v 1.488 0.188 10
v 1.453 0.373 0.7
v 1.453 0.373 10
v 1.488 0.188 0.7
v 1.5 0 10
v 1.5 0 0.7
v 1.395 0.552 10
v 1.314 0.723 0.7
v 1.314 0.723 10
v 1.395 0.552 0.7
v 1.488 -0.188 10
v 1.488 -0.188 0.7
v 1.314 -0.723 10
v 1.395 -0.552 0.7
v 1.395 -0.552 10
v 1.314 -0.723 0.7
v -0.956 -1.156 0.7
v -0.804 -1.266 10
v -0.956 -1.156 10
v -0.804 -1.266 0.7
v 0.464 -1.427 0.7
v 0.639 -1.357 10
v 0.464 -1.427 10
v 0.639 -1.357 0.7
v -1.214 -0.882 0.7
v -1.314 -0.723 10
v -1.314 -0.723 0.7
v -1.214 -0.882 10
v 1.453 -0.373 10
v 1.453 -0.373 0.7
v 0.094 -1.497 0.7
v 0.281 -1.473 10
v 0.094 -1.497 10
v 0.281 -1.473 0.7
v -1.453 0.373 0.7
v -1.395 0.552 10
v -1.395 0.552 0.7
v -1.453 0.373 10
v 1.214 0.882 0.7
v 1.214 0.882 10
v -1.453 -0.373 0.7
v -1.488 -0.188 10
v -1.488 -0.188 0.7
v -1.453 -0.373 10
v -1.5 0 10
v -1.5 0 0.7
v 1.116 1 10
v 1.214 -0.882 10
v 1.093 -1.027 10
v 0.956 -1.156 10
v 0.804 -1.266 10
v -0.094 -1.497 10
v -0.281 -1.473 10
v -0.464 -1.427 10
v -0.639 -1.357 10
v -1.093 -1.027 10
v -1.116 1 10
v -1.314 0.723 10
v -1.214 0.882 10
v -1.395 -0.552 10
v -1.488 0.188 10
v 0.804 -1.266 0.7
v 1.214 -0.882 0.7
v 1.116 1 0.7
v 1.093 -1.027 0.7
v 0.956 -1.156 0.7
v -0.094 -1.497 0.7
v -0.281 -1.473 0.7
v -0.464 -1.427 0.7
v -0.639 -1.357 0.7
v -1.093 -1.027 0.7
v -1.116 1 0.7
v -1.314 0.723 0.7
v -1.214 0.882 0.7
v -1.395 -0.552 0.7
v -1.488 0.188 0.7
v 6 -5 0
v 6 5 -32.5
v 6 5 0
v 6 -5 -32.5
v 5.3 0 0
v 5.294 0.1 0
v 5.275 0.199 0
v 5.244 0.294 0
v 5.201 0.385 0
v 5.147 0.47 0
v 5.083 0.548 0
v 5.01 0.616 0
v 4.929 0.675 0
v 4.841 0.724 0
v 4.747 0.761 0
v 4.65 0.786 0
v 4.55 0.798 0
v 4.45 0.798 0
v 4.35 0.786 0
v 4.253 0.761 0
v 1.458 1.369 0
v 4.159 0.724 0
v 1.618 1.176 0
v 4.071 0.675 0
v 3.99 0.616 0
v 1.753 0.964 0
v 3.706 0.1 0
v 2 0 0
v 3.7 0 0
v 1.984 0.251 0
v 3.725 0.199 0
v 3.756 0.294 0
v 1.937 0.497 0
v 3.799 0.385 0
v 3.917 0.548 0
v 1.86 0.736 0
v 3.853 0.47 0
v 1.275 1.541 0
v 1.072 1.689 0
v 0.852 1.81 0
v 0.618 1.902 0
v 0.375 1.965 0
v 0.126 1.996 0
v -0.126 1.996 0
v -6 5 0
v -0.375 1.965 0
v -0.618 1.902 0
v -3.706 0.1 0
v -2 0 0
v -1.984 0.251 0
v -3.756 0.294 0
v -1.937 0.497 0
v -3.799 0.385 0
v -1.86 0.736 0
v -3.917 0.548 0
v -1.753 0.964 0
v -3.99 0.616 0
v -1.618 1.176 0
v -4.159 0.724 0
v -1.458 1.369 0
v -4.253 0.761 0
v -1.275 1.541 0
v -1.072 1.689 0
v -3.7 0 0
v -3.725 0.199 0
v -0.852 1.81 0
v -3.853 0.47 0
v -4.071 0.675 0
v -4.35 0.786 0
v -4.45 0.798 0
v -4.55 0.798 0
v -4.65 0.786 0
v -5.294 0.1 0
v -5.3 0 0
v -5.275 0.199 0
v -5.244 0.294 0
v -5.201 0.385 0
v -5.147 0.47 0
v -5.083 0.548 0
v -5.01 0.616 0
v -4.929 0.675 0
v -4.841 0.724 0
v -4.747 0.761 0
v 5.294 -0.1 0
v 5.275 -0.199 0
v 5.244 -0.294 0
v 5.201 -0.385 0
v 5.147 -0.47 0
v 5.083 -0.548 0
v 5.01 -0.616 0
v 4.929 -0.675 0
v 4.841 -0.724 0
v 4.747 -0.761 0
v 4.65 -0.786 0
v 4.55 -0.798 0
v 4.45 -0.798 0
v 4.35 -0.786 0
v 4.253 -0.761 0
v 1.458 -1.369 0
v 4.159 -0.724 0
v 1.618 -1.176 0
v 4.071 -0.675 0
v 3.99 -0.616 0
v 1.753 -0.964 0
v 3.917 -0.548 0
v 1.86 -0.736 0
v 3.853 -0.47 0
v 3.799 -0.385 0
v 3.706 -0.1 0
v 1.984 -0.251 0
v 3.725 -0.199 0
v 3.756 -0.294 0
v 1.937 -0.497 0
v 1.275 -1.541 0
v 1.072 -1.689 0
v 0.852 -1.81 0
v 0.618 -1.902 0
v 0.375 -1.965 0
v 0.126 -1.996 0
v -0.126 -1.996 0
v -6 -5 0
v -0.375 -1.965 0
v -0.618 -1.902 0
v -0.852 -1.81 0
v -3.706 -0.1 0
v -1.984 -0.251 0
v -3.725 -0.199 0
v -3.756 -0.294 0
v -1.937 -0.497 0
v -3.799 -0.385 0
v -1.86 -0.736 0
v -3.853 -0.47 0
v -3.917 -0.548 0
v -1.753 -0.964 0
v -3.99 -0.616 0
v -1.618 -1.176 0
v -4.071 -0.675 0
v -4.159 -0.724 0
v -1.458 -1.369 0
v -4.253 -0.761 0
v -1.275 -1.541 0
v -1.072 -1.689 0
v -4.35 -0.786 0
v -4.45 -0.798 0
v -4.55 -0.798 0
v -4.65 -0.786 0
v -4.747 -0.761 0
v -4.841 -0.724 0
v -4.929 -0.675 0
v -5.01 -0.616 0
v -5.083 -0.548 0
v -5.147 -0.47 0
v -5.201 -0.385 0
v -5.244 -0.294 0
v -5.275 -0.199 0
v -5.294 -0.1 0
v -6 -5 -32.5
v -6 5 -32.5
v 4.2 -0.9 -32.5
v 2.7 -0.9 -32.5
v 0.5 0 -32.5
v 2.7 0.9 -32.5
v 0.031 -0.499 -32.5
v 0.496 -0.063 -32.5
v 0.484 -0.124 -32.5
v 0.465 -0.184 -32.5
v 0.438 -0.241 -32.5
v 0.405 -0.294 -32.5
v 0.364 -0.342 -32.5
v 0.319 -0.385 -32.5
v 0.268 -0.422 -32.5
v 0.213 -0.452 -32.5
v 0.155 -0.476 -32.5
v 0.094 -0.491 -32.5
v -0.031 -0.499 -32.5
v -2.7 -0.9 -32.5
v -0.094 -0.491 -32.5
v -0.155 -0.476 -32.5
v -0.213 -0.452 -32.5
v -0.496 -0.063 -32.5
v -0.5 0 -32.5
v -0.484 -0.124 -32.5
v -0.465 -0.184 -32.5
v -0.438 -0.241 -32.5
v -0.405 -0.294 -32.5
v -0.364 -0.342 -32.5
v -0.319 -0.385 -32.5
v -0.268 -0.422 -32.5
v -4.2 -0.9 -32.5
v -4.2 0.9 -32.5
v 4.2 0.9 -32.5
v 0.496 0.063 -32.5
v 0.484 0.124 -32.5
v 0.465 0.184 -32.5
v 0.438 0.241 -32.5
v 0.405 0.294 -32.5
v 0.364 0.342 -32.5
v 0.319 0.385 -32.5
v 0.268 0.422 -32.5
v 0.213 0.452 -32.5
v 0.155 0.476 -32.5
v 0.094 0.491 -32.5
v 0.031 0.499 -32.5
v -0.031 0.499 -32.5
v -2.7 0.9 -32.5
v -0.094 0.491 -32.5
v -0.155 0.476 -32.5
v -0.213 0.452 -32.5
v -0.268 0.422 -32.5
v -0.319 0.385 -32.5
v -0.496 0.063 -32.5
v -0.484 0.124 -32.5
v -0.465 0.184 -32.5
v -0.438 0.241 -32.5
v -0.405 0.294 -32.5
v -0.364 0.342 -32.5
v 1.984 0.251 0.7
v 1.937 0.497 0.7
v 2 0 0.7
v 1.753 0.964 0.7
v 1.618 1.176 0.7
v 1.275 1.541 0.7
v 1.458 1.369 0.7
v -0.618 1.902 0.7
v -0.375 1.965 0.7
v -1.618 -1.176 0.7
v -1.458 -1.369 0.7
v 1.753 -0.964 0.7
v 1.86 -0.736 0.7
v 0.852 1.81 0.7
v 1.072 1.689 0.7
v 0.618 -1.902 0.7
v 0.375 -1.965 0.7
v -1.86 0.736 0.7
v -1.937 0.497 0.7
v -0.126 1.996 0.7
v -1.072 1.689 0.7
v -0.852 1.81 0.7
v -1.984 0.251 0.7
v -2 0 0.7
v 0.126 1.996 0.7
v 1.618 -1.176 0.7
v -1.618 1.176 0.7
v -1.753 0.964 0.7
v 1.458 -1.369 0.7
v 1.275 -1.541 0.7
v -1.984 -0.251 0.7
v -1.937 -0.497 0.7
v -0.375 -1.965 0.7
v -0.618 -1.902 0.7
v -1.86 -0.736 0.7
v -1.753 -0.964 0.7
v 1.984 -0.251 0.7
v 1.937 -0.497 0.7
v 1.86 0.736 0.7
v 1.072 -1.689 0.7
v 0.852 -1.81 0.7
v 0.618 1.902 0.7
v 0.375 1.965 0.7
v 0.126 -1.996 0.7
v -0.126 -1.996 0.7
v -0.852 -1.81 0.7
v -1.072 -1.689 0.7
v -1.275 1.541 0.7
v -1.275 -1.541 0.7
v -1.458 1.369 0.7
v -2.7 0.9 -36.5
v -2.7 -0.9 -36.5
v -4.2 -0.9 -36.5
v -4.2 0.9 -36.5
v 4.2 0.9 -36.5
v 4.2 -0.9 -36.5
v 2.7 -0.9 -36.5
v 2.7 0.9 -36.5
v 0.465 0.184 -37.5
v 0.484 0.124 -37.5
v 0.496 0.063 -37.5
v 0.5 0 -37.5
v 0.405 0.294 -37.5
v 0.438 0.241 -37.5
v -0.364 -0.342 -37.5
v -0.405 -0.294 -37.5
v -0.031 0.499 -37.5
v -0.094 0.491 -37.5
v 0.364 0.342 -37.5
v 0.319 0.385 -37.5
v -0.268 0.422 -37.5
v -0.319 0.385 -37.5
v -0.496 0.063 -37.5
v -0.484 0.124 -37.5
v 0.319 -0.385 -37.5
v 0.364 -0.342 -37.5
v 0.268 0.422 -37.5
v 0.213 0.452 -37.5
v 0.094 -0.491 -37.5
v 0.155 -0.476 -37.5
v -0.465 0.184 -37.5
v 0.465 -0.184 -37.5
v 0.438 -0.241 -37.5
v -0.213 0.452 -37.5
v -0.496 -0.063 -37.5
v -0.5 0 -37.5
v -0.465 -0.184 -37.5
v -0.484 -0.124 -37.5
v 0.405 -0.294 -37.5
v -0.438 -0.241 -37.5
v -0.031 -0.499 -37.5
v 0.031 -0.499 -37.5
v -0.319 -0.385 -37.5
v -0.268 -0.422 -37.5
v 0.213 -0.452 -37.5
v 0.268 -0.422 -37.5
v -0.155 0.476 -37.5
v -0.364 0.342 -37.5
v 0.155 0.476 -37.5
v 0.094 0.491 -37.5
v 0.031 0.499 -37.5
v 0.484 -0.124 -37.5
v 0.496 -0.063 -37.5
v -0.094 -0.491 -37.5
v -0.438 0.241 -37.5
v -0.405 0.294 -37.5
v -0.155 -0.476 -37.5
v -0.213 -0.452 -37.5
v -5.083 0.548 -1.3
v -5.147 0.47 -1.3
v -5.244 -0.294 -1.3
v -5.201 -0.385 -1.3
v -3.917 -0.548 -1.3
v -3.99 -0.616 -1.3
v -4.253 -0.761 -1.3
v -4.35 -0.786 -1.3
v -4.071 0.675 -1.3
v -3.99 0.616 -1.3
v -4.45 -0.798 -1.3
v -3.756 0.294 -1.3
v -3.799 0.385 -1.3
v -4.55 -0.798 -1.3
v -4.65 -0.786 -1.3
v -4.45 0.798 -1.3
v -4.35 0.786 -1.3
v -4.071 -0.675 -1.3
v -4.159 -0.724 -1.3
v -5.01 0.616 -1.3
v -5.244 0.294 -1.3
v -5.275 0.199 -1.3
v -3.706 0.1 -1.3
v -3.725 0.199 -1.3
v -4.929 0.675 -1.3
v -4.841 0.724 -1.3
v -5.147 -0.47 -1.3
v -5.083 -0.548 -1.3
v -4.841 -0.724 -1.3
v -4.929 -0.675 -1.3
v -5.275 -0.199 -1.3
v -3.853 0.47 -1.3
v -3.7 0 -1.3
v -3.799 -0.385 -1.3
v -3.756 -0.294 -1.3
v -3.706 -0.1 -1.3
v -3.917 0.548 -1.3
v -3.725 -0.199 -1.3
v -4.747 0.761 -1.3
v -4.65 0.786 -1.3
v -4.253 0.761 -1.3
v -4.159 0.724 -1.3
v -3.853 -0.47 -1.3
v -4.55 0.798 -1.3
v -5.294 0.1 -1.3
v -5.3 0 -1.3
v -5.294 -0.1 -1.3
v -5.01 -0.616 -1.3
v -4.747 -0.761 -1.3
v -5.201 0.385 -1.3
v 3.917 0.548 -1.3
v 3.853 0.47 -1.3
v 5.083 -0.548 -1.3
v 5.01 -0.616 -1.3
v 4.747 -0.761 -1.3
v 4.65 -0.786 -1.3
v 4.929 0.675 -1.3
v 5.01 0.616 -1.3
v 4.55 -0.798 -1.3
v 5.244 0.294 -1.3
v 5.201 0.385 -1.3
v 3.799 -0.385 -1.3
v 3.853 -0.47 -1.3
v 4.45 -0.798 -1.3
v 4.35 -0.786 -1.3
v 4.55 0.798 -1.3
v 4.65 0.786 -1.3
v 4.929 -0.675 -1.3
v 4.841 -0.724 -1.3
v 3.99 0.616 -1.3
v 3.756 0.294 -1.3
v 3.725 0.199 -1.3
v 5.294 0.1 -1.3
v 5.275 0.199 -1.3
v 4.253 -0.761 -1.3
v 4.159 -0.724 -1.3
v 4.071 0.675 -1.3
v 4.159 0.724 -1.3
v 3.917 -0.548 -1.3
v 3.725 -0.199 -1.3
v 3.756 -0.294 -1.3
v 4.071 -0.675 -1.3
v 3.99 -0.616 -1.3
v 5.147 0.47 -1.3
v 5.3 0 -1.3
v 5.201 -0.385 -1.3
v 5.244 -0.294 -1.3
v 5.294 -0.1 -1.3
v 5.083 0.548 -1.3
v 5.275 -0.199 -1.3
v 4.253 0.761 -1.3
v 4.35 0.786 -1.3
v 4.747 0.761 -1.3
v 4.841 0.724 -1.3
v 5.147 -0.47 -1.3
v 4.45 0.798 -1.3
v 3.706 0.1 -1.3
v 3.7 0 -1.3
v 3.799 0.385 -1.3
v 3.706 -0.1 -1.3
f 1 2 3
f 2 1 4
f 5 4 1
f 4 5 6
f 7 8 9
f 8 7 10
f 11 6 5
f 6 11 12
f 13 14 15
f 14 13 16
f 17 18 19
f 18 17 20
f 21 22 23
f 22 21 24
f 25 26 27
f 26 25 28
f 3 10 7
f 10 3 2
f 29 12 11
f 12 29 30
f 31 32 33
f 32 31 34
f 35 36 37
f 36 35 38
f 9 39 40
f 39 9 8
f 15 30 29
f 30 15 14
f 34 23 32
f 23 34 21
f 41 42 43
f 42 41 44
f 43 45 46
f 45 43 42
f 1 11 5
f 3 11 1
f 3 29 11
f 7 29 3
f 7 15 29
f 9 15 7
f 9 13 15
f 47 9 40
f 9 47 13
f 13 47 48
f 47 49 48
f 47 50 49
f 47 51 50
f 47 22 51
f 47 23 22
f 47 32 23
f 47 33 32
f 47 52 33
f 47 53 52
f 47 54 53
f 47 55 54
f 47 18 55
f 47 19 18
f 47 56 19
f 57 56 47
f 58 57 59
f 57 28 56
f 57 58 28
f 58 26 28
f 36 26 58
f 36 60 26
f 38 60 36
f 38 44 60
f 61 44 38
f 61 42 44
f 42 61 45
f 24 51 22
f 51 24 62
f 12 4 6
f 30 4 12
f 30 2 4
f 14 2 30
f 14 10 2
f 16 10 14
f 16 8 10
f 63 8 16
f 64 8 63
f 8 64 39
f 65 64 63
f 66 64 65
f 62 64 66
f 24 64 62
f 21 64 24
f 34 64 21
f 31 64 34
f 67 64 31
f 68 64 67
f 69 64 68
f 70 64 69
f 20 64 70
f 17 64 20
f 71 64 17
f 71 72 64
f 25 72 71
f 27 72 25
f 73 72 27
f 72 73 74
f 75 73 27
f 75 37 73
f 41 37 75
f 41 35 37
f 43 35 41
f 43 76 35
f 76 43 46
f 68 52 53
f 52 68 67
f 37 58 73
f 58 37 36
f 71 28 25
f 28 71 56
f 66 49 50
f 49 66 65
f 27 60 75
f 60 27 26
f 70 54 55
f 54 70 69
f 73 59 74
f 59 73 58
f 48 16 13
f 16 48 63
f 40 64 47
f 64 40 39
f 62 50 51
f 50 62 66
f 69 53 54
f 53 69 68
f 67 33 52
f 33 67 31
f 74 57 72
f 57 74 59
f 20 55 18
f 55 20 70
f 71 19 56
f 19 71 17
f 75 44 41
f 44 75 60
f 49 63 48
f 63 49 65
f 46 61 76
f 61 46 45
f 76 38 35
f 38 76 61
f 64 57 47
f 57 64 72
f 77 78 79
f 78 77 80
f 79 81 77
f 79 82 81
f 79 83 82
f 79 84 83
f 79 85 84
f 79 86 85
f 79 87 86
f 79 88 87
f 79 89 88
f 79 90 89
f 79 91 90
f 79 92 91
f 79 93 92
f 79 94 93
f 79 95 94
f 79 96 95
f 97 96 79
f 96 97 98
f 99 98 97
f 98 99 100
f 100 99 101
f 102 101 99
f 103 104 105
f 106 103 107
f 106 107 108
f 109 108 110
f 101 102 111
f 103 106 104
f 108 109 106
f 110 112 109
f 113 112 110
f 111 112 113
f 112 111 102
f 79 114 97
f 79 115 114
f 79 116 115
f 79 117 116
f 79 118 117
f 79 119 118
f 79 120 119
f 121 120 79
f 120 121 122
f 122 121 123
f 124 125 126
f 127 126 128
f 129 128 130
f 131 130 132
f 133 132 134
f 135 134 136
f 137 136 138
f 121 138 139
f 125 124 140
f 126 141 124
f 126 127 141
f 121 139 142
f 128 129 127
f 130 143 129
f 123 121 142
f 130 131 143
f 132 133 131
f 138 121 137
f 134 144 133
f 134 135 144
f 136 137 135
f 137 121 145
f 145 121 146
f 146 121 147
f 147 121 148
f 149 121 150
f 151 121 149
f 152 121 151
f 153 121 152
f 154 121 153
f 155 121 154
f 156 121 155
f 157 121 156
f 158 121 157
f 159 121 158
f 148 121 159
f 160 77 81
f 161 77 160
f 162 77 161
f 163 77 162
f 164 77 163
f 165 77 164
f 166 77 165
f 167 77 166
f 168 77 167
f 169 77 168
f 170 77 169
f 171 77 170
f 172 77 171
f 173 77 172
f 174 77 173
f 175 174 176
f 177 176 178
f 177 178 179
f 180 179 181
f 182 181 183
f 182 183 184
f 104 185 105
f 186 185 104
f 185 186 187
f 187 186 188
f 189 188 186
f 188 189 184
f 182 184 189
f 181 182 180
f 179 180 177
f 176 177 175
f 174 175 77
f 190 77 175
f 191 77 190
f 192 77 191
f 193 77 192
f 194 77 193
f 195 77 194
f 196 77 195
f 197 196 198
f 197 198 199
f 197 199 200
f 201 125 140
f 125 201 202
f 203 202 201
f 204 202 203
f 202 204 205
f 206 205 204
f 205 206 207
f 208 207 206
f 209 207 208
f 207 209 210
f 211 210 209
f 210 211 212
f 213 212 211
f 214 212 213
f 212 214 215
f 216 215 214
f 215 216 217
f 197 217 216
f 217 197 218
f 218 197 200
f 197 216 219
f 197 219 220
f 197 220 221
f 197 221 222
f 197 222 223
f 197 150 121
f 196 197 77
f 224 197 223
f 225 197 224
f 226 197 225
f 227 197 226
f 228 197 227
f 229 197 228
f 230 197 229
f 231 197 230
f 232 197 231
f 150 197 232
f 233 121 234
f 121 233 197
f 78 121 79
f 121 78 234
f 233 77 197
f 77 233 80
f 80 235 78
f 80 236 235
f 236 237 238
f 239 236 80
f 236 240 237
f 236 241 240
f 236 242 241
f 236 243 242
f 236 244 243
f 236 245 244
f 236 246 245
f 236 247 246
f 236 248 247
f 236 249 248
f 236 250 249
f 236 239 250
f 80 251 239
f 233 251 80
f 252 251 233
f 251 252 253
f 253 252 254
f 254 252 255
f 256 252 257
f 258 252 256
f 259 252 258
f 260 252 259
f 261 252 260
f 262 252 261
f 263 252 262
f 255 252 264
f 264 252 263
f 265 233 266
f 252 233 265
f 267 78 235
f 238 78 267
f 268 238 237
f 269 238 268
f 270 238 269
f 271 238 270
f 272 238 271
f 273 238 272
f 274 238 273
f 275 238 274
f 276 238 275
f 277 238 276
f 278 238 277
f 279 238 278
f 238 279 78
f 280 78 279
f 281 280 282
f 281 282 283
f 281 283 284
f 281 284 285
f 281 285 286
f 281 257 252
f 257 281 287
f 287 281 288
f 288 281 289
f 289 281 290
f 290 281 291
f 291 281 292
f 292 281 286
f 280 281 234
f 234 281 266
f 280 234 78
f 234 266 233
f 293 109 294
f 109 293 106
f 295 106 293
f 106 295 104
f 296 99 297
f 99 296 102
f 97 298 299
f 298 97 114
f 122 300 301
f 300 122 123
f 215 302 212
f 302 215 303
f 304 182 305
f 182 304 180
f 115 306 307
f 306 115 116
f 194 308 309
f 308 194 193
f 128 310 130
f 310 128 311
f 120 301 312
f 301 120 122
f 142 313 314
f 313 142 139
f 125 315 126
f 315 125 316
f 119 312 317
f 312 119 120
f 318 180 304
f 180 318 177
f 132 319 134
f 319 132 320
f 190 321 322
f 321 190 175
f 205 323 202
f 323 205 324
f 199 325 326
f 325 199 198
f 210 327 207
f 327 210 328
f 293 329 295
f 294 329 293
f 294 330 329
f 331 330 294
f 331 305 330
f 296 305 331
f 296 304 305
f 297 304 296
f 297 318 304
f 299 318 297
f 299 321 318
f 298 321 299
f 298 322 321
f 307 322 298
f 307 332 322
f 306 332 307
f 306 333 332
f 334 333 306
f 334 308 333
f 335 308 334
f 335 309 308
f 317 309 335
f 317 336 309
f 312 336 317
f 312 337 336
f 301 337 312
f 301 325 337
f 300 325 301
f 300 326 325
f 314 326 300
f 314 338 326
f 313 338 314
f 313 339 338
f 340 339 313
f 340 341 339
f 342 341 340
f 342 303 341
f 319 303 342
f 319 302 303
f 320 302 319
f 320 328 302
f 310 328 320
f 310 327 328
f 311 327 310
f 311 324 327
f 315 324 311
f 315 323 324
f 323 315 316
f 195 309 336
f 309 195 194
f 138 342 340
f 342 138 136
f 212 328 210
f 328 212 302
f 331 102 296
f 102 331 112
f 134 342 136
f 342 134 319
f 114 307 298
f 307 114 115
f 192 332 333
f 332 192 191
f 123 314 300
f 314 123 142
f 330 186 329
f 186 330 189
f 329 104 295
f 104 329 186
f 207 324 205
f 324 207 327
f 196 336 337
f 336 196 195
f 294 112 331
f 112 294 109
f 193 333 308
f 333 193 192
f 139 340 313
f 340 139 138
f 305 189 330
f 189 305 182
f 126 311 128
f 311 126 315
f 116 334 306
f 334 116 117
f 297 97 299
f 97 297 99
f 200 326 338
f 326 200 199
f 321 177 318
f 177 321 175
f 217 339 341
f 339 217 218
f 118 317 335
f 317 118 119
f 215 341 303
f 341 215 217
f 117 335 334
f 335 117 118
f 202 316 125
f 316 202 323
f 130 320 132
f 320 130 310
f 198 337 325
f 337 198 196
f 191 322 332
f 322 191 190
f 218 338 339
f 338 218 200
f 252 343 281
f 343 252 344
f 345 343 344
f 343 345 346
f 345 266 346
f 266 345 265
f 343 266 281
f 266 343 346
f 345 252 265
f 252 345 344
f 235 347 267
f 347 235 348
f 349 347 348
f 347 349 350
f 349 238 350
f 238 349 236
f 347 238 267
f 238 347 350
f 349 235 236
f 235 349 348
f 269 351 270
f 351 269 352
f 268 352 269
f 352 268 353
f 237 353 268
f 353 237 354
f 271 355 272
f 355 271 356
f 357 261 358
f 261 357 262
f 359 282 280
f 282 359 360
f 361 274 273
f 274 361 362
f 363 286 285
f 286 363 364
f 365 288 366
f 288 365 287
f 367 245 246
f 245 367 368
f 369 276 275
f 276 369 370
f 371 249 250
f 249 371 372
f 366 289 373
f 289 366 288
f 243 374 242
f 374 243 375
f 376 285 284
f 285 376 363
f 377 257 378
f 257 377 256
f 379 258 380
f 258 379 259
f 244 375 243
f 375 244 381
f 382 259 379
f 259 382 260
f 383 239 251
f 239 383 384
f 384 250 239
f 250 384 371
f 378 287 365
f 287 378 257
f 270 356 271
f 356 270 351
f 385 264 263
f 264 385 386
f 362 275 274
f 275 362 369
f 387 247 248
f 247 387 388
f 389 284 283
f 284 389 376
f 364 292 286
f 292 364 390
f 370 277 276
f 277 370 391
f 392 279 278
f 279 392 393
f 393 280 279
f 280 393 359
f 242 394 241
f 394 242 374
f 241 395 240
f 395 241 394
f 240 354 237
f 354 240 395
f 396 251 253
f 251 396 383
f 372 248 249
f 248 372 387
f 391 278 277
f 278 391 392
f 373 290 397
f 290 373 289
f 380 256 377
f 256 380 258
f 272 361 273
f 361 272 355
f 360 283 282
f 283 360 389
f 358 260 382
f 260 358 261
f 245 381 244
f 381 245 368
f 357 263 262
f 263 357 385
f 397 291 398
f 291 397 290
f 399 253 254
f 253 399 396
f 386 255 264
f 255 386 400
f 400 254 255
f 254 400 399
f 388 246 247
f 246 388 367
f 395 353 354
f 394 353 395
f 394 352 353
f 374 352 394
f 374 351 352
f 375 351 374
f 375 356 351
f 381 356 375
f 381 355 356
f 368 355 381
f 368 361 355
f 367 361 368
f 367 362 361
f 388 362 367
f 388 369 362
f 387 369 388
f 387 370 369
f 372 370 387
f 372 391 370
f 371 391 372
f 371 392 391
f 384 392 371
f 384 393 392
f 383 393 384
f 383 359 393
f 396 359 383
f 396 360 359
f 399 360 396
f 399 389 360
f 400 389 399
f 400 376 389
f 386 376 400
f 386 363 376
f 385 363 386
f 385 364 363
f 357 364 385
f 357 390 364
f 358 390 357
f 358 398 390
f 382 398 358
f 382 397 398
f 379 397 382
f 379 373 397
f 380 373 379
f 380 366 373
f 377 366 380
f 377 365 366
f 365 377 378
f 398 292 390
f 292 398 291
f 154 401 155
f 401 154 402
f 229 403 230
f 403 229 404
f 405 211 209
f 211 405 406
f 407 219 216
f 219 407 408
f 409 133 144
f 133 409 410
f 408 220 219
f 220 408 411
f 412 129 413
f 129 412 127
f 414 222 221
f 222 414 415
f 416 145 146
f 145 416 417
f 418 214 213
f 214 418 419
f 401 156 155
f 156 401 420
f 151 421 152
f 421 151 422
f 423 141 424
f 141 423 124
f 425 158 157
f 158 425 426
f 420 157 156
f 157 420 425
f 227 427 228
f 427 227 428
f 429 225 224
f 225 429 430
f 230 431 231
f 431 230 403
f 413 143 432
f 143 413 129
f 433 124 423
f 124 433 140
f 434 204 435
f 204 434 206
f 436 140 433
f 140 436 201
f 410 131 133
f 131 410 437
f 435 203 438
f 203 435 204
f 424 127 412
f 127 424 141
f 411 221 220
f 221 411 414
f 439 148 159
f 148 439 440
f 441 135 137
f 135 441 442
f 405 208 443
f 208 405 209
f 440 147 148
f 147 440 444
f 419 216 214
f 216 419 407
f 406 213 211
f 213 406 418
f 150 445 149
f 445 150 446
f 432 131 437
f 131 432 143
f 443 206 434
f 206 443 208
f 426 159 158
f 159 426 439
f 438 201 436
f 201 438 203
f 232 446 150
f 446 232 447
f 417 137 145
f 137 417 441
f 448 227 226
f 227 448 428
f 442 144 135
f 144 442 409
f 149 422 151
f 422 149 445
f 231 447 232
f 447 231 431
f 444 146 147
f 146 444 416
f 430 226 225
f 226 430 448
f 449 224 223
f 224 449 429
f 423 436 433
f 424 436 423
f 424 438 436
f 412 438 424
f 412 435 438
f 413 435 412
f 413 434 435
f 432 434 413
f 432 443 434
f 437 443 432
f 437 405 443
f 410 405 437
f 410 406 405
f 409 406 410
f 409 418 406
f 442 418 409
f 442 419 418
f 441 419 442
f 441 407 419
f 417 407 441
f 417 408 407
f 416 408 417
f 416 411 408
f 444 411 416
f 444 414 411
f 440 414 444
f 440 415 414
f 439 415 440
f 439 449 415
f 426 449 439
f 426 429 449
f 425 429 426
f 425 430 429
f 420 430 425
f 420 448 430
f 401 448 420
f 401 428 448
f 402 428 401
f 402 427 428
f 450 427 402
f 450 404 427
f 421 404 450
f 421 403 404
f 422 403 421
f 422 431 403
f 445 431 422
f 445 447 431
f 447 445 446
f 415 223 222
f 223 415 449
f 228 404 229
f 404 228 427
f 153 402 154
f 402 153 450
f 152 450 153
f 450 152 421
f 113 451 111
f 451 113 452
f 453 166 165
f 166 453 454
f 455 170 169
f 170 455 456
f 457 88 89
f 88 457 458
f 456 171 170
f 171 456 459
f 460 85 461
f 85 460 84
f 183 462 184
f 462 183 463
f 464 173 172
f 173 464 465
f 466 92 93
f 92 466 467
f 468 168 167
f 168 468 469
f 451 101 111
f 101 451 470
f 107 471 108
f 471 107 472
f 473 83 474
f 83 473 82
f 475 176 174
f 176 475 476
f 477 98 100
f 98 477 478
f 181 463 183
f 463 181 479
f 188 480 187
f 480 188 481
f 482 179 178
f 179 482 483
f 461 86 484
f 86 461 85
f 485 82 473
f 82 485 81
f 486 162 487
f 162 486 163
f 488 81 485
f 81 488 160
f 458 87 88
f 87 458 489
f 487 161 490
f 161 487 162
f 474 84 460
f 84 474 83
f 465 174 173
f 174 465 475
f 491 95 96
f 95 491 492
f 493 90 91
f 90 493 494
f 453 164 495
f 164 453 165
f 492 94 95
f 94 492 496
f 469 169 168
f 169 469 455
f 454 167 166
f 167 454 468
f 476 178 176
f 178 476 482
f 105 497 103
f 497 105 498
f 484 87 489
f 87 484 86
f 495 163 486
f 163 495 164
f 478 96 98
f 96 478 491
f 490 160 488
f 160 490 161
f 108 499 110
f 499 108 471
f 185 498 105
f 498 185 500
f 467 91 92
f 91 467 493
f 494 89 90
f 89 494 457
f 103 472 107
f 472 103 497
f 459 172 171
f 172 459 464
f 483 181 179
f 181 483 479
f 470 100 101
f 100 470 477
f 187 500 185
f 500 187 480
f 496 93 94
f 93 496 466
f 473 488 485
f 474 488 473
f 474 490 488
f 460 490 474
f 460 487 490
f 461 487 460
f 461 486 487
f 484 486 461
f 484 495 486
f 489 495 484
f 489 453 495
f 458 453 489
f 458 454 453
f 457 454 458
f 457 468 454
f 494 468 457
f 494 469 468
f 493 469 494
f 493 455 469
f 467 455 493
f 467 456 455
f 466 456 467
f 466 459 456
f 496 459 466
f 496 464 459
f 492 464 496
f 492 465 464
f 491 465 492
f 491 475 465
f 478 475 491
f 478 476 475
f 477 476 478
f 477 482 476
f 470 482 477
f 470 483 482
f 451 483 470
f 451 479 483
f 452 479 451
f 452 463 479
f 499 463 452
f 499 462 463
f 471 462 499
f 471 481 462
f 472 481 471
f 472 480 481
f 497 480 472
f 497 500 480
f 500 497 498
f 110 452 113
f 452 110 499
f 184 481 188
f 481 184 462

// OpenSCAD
$fn = 50;

difference() {
	union() {
		translate(v = [0, 0, 0.7]) {
			rotate(a = [0, 0, 0]) {
				difference() {
					union() {
						cylinder(h = 9.3, r = 1.5);
					}
					union() {
						translate(v = [-6.0, 1.0, -1]) {
							cube(size = [12, 12, 11.3]);
						}
					}
				}
			}
		}
		translate(v = [-6.0, -5.0, -9]) {
			cube(size = [12, 10, 9]);
		}
		translate(v = [-6.0, -5.0, -32.5]) {
			cube(size = [12, 10, 23.5]);
		}
		cylinder(h = 0.7, r = 2.0);
		translate(v = [-4.2, -0.9, -36.5]) {
			cube(size = [1.5, 1.8, 4]);
		}
		translate(v = [2.7, -0.9, -36.5]) {
			cube(size = [1.5, 1.8, 4]);
		}
		translate(v = [0, 0, -37.5]) {
			cylinder(h = 5, r = 0.5);
		}
	}
	union() {
		translate(v = [-4.5, 0, -1.3]) {
			cylinder(h = 1.31, r = 0.8);
		}
		translate(v = [4.5, 0, -1.3]) {
			cylinder(h = 1.31, r = 0.8);
		}
	}
}
